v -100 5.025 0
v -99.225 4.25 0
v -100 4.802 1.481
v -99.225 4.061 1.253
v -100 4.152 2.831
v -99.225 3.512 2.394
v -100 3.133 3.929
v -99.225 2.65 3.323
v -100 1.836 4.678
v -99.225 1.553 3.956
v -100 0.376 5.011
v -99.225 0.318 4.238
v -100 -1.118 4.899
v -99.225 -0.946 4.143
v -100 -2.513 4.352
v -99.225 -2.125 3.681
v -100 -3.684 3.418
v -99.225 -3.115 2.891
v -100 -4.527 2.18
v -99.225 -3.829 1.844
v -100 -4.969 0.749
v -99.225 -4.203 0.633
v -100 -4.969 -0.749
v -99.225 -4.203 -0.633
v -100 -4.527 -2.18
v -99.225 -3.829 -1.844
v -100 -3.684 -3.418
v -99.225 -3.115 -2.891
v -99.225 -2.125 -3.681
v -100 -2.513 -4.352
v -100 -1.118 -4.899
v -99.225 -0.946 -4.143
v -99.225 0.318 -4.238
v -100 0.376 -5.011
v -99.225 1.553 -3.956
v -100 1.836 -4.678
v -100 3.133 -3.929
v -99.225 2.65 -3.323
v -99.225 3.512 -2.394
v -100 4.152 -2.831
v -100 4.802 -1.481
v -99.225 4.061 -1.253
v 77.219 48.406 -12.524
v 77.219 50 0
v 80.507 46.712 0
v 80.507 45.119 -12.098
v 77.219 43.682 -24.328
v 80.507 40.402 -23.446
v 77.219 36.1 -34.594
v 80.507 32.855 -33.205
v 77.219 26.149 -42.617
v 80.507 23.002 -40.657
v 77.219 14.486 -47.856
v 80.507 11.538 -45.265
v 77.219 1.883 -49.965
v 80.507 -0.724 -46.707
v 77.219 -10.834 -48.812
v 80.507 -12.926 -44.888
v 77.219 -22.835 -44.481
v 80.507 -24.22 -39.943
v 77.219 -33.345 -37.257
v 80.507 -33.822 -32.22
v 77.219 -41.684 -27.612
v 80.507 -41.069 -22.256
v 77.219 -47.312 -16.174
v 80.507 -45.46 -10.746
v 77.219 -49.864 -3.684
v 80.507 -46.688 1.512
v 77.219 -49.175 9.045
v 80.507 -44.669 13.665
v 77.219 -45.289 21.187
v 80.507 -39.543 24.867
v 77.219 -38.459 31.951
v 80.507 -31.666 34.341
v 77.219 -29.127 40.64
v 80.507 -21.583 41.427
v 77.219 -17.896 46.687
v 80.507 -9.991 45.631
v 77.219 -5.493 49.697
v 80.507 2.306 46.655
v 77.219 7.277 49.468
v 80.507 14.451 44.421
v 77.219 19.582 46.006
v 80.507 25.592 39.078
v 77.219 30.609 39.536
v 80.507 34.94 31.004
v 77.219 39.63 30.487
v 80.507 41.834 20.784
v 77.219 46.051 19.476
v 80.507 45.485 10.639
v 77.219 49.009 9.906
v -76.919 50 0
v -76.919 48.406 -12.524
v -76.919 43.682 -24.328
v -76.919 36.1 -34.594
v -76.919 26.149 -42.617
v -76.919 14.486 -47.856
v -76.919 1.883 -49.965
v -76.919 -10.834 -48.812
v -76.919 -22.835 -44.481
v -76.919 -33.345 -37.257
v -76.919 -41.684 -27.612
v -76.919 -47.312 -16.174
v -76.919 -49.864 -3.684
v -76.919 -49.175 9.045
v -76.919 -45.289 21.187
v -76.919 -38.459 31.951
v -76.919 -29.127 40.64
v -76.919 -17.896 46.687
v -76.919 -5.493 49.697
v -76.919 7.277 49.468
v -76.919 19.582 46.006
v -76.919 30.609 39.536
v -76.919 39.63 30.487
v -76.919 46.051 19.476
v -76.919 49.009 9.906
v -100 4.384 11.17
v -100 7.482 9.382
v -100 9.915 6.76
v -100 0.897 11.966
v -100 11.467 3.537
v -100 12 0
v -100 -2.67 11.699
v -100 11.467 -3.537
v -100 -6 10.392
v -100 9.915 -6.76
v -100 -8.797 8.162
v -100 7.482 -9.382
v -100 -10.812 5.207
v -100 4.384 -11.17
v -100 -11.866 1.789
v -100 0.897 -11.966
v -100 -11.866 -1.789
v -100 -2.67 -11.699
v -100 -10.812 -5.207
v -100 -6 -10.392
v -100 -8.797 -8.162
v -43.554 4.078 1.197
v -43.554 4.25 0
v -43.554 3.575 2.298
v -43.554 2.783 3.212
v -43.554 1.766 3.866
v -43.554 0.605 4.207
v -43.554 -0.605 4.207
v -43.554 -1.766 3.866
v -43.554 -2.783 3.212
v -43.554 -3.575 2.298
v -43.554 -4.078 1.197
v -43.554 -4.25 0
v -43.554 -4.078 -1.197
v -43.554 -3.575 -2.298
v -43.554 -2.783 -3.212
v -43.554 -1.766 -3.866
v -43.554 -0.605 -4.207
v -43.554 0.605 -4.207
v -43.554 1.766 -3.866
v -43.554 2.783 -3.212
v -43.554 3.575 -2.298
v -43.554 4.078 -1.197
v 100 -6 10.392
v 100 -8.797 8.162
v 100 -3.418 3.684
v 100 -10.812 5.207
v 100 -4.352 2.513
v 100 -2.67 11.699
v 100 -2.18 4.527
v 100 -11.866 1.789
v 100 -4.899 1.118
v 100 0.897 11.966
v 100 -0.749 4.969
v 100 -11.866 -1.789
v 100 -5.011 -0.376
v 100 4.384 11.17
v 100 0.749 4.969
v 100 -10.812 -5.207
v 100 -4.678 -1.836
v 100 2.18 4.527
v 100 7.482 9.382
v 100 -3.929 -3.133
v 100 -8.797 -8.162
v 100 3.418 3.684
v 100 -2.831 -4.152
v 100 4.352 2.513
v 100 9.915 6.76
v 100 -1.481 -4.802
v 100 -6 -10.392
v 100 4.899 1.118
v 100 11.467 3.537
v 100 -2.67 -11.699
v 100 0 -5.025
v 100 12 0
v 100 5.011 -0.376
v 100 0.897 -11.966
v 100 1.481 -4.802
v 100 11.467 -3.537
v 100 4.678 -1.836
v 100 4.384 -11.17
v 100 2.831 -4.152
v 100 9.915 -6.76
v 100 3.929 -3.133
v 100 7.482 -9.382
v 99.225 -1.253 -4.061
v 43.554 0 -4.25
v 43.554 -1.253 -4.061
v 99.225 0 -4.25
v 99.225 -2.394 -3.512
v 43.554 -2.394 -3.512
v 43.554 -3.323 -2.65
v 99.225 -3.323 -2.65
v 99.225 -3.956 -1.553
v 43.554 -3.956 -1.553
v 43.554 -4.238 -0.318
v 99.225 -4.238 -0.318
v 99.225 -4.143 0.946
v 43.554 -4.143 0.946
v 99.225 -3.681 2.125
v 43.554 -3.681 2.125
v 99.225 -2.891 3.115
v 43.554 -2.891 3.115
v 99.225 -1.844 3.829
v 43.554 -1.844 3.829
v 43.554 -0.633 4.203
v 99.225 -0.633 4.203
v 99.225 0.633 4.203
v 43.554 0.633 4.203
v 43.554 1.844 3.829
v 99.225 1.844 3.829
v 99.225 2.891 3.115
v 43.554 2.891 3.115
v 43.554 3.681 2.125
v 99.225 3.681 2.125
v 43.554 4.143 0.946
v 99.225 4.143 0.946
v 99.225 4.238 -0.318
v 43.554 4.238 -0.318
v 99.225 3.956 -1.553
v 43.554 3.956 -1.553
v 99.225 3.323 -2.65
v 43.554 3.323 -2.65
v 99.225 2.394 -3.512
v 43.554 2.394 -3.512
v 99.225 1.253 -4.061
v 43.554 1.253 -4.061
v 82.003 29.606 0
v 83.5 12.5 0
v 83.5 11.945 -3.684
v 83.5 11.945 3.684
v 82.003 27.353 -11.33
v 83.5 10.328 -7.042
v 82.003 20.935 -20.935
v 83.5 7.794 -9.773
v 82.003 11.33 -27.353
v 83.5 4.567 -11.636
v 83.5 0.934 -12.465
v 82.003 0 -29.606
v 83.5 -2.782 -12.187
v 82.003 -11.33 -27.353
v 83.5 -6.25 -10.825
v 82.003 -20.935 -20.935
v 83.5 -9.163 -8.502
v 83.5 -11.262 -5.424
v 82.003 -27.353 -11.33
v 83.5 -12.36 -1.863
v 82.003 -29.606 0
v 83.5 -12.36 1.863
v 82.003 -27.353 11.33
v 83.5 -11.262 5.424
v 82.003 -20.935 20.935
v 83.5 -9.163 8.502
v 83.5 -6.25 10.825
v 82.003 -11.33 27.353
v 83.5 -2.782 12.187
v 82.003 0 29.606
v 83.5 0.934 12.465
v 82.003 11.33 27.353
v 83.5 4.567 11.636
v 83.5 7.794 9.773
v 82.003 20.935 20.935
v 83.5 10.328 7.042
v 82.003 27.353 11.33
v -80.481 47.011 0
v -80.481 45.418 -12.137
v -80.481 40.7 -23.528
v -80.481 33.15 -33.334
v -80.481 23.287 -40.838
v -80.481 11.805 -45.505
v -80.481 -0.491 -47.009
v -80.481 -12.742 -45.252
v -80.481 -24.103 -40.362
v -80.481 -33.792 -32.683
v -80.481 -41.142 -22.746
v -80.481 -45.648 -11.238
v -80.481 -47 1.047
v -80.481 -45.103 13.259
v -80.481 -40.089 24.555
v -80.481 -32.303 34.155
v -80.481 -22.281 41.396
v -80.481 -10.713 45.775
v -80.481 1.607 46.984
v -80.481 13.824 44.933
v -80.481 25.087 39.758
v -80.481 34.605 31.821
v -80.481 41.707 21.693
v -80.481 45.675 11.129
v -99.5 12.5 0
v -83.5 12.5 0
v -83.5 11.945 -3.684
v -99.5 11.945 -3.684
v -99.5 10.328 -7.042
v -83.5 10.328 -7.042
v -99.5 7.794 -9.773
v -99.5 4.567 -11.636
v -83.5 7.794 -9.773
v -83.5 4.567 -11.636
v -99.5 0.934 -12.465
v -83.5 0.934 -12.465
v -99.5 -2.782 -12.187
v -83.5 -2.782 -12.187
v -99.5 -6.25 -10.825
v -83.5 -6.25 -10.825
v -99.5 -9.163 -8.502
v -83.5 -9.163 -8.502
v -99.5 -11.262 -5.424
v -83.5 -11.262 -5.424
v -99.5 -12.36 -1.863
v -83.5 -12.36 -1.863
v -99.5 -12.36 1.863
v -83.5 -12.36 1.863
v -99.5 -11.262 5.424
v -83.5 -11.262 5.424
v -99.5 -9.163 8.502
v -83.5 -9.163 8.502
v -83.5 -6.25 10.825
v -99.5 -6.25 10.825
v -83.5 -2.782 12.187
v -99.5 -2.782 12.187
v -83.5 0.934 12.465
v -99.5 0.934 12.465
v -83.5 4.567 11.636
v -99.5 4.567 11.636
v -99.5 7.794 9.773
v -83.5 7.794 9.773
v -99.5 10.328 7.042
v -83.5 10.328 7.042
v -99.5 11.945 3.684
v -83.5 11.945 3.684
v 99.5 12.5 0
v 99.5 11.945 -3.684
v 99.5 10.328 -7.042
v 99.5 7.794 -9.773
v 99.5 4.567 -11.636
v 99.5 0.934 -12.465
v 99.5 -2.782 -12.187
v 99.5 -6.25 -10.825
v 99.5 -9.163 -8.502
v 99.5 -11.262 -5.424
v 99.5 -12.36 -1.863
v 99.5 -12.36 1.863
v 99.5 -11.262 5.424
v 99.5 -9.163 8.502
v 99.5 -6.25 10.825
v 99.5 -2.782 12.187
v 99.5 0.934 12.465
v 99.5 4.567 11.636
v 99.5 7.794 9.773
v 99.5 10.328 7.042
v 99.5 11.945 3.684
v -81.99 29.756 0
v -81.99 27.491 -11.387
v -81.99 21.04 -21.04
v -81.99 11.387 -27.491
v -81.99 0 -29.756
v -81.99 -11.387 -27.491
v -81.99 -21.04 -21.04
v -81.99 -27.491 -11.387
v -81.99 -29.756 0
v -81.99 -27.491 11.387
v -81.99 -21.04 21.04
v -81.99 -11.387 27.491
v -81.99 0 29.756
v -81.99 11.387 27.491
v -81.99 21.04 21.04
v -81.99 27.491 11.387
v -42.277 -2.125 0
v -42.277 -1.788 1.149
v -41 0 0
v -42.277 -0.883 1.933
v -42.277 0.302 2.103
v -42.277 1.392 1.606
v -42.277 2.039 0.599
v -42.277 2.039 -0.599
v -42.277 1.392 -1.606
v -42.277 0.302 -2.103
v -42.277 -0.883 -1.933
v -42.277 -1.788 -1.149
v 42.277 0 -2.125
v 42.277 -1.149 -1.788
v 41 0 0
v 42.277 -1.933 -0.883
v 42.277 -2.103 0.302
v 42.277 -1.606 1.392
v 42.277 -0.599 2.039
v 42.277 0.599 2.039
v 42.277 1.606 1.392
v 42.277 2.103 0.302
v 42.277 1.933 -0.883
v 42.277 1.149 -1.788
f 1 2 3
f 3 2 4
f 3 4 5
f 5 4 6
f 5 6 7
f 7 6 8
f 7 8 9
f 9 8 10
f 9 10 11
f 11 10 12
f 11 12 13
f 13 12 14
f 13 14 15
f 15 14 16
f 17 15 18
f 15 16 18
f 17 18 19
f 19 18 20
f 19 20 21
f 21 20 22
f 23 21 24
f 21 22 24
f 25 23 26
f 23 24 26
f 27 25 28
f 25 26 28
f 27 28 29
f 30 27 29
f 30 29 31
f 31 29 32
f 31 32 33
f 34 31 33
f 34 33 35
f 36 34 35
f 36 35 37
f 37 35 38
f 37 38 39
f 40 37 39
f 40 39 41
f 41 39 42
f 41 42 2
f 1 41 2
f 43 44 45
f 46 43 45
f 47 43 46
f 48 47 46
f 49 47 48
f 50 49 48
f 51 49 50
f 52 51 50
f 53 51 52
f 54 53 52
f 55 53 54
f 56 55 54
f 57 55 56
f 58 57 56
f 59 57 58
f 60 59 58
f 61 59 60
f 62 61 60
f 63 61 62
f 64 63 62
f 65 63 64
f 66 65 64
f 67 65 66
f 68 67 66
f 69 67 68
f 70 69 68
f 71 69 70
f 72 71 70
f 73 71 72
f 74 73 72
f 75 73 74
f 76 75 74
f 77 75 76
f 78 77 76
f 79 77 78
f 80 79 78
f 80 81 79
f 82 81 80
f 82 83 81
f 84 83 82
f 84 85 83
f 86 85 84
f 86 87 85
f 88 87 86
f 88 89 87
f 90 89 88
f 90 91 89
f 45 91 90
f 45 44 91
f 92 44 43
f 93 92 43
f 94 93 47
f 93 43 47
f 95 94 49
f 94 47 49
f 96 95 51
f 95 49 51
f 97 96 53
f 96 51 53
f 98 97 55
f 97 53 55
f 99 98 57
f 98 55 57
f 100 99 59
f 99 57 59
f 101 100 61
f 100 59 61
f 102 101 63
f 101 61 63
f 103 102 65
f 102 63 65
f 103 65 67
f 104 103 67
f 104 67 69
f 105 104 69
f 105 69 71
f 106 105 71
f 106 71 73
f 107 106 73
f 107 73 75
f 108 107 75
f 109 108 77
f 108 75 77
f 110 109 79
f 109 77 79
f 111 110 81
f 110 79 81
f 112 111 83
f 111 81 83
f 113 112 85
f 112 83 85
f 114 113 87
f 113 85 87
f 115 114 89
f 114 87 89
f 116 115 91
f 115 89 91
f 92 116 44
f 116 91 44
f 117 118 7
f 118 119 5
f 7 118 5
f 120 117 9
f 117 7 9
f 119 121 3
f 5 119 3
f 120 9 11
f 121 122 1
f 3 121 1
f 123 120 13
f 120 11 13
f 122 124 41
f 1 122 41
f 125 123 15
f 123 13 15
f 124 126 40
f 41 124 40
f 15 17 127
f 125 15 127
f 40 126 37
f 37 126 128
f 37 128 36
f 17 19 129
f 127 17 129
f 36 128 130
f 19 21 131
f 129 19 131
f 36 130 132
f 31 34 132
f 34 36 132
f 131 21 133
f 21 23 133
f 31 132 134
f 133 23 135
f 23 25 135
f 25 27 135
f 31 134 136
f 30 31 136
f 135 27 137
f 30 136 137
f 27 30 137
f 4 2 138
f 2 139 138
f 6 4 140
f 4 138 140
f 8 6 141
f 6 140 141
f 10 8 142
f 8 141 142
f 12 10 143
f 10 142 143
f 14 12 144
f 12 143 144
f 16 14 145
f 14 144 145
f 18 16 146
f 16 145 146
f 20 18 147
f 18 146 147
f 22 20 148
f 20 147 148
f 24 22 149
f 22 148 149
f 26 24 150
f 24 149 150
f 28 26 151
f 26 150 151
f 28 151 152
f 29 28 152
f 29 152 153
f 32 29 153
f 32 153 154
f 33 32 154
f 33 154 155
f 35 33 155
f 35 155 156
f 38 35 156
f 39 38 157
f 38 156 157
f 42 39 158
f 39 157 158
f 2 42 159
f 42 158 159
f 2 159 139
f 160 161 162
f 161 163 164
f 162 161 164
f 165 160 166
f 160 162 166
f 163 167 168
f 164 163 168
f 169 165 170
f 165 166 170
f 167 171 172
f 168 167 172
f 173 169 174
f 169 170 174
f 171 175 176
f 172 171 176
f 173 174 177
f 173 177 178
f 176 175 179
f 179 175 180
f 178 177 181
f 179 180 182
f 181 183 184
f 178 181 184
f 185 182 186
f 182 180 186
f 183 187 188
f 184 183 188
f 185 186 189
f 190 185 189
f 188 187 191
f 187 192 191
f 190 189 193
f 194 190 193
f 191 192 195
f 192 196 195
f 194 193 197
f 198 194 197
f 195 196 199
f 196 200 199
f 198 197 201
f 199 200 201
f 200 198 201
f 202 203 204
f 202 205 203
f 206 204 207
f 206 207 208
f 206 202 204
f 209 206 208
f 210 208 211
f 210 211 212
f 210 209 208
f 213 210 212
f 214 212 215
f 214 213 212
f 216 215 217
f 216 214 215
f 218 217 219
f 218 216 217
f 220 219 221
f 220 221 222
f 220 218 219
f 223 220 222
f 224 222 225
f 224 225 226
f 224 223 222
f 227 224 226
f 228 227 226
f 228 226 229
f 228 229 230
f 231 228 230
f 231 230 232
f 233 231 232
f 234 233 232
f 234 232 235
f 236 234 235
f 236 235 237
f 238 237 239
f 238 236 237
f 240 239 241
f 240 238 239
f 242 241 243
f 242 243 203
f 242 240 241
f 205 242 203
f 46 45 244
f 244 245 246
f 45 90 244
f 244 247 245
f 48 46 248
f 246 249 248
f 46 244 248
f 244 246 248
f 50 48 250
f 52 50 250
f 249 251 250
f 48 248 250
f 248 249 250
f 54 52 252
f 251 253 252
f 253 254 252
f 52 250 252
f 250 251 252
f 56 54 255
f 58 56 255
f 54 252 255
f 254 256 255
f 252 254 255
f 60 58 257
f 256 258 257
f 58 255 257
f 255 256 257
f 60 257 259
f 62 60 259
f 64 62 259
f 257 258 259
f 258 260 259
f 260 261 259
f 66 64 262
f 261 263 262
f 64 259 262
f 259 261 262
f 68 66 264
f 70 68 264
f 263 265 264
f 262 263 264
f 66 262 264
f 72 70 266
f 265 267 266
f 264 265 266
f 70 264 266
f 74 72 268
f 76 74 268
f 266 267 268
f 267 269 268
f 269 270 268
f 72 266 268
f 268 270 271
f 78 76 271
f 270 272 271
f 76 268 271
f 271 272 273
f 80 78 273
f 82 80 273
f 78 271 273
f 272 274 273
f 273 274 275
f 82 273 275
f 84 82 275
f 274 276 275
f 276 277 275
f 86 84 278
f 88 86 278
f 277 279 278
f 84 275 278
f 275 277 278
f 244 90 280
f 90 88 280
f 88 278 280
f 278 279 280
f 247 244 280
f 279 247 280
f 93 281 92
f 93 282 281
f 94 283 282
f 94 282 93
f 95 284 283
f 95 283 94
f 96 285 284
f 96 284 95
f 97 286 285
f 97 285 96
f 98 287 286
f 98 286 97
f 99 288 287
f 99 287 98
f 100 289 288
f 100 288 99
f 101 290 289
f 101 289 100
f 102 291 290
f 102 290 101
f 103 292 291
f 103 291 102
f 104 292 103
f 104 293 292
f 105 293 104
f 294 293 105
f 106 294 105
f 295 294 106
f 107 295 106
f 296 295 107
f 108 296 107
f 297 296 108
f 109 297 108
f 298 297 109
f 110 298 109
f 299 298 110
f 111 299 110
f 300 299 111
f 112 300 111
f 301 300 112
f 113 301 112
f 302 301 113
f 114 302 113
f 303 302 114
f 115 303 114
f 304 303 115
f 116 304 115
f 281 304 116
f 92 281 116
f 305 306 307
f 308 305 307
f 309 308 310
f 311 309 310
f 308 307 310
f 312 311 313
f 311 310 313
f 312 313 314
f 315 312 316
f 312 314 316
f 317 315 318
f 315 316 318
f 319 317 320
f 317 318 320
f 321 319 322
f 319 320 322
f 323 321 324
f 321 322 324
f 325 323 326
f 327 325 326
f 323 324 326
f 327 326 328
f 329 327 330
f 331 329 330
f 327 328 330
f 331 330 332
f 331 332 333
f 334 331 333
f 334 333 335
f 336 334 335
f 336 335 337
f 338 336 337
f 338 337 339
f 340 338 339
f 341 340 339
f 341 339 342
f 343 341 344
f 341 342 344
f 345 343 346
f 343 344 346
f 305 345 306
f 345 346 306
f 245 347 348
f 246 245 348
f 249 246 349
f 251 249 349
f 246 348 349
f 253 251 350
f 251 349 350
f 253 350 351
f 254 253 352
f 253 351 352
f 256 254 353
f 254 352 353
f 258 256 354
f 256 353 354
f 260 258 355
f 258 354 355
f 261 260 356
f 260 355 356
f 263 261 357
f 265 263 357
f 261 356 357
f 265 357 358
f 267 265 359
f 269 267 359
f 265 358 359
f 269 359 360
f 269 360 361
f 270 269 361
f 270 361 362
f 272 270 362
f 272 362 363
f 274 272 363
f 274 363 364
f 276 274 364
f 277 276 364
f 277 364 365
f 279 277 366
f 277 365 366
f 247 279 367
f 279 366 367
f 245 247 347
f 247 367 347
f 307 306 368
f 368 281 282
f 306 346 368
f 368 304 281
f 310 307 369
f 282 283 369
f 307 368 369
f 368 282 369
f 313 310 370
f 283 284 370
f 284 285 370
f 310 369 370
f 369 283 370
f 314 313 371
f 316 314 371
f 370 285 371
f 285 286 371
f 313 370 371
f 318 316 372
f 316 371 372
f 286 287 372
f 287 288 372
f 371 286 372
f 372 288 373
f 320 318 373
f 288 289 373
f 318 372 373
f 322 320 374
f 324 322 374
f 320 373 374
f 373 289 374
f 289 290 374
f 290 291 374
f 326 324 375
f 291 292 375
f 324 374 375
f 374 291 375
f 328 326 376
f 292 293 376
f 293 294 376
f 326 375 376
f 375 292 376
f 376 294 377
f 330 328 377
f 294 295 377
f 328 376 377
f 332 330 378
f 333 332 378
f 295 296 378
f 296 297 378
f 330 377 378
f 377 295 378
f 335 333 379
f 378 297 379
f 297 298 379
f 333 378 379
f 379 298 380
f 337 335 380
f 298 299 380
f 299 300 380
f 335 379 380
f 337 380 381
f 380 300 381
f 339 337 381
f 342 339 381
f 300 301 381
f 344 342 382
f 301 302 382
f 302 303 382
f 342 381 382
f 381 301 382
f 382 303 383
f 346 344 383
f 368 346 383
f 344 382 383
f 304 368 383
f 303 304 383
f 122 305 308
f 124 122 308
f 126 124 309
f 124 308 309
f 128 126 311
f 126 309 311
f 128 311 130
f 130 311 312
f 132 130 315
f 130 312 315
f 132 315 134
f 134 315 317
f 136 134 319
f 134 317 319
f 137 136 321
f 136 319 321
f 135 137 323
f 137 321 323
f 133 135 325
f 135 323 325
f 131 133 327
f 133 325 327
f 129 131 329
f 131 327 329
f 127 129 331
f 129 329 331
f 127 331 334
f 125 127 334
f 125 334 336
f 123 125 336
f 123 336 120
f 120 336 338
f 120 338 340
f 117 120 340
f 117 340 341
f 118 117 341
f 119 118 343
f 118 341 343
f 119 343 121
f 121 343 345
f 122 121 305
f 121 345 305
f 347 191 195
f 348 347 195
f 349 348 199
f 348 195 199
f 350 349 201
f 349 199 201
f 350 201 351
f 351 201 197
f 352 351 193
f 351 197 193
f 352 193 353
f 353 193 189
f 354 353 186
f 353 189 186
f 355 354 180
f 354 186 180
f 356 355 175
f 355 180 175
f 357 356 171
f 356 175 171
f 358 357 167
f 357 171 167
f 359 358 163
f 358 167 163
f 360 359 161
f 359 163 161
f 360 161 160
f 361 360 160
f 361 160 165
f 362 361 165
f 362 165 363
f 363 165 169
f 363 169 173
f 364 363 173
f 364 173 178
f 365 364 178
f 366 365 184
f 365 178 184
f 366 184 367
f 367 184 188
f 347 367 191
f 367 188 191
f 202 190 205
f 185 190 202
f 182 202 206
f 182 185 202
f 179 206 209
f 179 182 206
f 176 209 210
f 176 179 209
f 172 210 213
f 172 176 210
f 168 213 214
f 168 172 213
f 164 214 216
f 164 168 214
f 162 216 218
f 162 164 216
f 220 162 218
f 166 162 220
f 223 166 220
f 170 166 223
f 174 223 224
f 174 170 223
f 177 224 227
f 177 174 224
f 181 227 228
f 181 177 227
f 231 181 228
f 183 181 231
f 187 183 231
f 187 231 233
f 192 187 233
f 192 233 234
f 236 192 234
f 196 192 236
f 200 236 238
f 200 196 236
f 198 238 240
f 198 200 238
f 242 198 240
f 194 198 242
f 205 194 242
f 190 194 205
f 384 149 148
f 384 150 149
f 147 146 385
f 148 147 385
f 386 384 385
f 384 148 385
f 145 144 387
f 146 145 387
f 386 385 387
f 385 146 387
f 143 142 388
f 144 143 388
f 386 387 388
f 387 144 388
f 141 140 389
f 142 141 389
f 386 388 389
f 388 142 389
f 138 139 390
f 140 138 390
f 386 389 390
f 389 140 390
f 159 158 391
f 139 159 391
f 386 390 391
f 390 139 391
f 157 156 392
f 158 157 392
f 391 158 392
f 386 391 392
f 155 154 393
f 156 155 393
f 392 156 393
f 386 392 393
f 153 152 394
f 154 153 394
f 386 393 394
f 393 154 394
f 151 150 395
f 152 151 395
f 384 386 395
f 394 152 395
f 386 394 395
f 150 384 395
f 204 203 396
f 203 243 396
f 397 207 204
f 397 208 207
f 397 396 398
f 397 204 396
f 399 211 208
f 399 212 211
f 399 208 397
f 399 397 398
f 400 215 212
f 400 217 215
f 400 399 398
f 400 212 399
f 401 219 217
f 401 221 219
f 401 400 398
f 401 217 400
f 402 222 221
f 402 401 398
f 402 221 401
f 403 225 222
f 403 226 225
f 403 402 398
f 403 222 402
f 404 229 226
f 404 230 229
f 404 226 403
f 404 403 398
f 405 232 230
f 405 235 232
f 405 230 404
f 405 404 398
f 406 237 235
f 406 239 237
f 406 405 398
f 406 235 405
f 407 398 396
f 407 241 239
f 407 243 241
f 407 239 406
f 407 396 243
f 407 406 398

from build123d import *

# Parameters (mm, degrees)
CHAMFER1_SIZE                = 0.5
CHAMFER2_SIZE                = 3
CHAMFER2_SIZE2               = 3.300188603
CHAMFER3_SIZE                = 3
CHAMFER3_SIZE2               = 3.300188603
CHAMFER4_SIZE                = 0.5
M10_TAPPED_HOLE2_D           = 8.5
M10_TAPPED_HOLE2_DEPTH       = 56.446342369
M10_TAPPED_HOLE2_CSINK_D     = 10.05
M10_TAPPED_HOLE2_CSINK_ANGLE = 90
M10_TAPPED_HOLE2_TIP         = 2.553657631


with BuildPart() as part:
    # Sketch1 → Revolve1 (revolve)
    with BuildSketch(Plane.XY):
        Polygon((-100, 0), (-100, 12.5), (-83.5, 12.5), (-80.219175118, 50), (80.219175118, 50), (83.5, 12.5), (100, 12.5), (100, 0), align=None)
    revolve(axis=Axis((100, 0, 0), (-1, 0, 0)))

    # Chamfer1
    chamfer1_edges = [part.edges().sort_by_distance(p)[0] for p in [
        (-100, -12.5, 0),
    ]]
    chamfer(chamfer1_edges, length=CHAMFER1_SIZE)

    # Chamfer2
    chamfer2_edges = [part.edges().sort_by_distance(p)[0] for p in [
        (-80.219175118, -50, 0),
    ]]
    chamfer2_side = [part.faces().sort_by_distance(p)[0] for p in [
        (-81.859587559, -31.25, 0),
    ]]
    chamfer(chamfer2_edges, length=CHAMFER2_SIZE, length2=CHAMFER2_SIZE2, reference=chamfer2_side[0])

    # Chamfer3
    chamfer3_edges = [part.edges().sort_by_distance(p)[0] for p in [
        (80.219175118, -50, 0),
    ]]
    chamfer3_side = [part.faces().sort_by_distance(p)[0] for p in [
        (1.650094301, -50, 0),
    ]]
    chamfer(chamfer3_edges, length=CHAMFER3_SIZE, length2=CHAMFER3_SIZE2, reference=chamfer3_side[0])

    # Chamfer4
    chamfer4_edges = [part.edges().sort_by_distance(p)[0] for p in [
        (100, -12.5, 0),
    ]]
    chamfer(chamfer4_edges, length=CHAMFER4_SIZE)

    # Sketch5 → M10 Tapped Hole1 (revolve, cut)
    with BuildSketch(Plane(origin=(100, 0, 0), x_dir=(0, 0, -1), z_dir=(0, 1, 0))):
        Polygon((0, 0), (0, 59), (4.25, 56.446342369), (4.25, 0.775), (5.025, 0), align=None)
    revolve(axis=Axis((106.35, 0, 0), (-1, 0, 0)), mode=Mode.SUBTRACT)

    # M10 Tapped Hole2
    with Locations(Plane(origin=(-100, 0, 0), x_dir=(0, -1, 0), z_dir=(-1, 0, 0))):
        with Locations((0, 0)):
            CounterSinkHole(M10_TAPPED_HOLE2_D / 2, M10_TAPPED_HOLE2_CSINK_D / 2, depth=M10_TAPPED_HOLE2_DEPTH, counter_sink_angle=M10_TAPPED_HOLE2_CSINK_ANGLE)
            with Locations((0, 0, -(M10_TAPPED_HOLE2_DEPTH + M10_TAPPED_HOLE2_TIP / 2))):  # 118° drill point
                Cone(0, M10_TAPPED_HOLE2_D / 2, M10_TAPPED_HOLE2_TIP, mode=Mode.SUBTRACT)


solid = part.part
